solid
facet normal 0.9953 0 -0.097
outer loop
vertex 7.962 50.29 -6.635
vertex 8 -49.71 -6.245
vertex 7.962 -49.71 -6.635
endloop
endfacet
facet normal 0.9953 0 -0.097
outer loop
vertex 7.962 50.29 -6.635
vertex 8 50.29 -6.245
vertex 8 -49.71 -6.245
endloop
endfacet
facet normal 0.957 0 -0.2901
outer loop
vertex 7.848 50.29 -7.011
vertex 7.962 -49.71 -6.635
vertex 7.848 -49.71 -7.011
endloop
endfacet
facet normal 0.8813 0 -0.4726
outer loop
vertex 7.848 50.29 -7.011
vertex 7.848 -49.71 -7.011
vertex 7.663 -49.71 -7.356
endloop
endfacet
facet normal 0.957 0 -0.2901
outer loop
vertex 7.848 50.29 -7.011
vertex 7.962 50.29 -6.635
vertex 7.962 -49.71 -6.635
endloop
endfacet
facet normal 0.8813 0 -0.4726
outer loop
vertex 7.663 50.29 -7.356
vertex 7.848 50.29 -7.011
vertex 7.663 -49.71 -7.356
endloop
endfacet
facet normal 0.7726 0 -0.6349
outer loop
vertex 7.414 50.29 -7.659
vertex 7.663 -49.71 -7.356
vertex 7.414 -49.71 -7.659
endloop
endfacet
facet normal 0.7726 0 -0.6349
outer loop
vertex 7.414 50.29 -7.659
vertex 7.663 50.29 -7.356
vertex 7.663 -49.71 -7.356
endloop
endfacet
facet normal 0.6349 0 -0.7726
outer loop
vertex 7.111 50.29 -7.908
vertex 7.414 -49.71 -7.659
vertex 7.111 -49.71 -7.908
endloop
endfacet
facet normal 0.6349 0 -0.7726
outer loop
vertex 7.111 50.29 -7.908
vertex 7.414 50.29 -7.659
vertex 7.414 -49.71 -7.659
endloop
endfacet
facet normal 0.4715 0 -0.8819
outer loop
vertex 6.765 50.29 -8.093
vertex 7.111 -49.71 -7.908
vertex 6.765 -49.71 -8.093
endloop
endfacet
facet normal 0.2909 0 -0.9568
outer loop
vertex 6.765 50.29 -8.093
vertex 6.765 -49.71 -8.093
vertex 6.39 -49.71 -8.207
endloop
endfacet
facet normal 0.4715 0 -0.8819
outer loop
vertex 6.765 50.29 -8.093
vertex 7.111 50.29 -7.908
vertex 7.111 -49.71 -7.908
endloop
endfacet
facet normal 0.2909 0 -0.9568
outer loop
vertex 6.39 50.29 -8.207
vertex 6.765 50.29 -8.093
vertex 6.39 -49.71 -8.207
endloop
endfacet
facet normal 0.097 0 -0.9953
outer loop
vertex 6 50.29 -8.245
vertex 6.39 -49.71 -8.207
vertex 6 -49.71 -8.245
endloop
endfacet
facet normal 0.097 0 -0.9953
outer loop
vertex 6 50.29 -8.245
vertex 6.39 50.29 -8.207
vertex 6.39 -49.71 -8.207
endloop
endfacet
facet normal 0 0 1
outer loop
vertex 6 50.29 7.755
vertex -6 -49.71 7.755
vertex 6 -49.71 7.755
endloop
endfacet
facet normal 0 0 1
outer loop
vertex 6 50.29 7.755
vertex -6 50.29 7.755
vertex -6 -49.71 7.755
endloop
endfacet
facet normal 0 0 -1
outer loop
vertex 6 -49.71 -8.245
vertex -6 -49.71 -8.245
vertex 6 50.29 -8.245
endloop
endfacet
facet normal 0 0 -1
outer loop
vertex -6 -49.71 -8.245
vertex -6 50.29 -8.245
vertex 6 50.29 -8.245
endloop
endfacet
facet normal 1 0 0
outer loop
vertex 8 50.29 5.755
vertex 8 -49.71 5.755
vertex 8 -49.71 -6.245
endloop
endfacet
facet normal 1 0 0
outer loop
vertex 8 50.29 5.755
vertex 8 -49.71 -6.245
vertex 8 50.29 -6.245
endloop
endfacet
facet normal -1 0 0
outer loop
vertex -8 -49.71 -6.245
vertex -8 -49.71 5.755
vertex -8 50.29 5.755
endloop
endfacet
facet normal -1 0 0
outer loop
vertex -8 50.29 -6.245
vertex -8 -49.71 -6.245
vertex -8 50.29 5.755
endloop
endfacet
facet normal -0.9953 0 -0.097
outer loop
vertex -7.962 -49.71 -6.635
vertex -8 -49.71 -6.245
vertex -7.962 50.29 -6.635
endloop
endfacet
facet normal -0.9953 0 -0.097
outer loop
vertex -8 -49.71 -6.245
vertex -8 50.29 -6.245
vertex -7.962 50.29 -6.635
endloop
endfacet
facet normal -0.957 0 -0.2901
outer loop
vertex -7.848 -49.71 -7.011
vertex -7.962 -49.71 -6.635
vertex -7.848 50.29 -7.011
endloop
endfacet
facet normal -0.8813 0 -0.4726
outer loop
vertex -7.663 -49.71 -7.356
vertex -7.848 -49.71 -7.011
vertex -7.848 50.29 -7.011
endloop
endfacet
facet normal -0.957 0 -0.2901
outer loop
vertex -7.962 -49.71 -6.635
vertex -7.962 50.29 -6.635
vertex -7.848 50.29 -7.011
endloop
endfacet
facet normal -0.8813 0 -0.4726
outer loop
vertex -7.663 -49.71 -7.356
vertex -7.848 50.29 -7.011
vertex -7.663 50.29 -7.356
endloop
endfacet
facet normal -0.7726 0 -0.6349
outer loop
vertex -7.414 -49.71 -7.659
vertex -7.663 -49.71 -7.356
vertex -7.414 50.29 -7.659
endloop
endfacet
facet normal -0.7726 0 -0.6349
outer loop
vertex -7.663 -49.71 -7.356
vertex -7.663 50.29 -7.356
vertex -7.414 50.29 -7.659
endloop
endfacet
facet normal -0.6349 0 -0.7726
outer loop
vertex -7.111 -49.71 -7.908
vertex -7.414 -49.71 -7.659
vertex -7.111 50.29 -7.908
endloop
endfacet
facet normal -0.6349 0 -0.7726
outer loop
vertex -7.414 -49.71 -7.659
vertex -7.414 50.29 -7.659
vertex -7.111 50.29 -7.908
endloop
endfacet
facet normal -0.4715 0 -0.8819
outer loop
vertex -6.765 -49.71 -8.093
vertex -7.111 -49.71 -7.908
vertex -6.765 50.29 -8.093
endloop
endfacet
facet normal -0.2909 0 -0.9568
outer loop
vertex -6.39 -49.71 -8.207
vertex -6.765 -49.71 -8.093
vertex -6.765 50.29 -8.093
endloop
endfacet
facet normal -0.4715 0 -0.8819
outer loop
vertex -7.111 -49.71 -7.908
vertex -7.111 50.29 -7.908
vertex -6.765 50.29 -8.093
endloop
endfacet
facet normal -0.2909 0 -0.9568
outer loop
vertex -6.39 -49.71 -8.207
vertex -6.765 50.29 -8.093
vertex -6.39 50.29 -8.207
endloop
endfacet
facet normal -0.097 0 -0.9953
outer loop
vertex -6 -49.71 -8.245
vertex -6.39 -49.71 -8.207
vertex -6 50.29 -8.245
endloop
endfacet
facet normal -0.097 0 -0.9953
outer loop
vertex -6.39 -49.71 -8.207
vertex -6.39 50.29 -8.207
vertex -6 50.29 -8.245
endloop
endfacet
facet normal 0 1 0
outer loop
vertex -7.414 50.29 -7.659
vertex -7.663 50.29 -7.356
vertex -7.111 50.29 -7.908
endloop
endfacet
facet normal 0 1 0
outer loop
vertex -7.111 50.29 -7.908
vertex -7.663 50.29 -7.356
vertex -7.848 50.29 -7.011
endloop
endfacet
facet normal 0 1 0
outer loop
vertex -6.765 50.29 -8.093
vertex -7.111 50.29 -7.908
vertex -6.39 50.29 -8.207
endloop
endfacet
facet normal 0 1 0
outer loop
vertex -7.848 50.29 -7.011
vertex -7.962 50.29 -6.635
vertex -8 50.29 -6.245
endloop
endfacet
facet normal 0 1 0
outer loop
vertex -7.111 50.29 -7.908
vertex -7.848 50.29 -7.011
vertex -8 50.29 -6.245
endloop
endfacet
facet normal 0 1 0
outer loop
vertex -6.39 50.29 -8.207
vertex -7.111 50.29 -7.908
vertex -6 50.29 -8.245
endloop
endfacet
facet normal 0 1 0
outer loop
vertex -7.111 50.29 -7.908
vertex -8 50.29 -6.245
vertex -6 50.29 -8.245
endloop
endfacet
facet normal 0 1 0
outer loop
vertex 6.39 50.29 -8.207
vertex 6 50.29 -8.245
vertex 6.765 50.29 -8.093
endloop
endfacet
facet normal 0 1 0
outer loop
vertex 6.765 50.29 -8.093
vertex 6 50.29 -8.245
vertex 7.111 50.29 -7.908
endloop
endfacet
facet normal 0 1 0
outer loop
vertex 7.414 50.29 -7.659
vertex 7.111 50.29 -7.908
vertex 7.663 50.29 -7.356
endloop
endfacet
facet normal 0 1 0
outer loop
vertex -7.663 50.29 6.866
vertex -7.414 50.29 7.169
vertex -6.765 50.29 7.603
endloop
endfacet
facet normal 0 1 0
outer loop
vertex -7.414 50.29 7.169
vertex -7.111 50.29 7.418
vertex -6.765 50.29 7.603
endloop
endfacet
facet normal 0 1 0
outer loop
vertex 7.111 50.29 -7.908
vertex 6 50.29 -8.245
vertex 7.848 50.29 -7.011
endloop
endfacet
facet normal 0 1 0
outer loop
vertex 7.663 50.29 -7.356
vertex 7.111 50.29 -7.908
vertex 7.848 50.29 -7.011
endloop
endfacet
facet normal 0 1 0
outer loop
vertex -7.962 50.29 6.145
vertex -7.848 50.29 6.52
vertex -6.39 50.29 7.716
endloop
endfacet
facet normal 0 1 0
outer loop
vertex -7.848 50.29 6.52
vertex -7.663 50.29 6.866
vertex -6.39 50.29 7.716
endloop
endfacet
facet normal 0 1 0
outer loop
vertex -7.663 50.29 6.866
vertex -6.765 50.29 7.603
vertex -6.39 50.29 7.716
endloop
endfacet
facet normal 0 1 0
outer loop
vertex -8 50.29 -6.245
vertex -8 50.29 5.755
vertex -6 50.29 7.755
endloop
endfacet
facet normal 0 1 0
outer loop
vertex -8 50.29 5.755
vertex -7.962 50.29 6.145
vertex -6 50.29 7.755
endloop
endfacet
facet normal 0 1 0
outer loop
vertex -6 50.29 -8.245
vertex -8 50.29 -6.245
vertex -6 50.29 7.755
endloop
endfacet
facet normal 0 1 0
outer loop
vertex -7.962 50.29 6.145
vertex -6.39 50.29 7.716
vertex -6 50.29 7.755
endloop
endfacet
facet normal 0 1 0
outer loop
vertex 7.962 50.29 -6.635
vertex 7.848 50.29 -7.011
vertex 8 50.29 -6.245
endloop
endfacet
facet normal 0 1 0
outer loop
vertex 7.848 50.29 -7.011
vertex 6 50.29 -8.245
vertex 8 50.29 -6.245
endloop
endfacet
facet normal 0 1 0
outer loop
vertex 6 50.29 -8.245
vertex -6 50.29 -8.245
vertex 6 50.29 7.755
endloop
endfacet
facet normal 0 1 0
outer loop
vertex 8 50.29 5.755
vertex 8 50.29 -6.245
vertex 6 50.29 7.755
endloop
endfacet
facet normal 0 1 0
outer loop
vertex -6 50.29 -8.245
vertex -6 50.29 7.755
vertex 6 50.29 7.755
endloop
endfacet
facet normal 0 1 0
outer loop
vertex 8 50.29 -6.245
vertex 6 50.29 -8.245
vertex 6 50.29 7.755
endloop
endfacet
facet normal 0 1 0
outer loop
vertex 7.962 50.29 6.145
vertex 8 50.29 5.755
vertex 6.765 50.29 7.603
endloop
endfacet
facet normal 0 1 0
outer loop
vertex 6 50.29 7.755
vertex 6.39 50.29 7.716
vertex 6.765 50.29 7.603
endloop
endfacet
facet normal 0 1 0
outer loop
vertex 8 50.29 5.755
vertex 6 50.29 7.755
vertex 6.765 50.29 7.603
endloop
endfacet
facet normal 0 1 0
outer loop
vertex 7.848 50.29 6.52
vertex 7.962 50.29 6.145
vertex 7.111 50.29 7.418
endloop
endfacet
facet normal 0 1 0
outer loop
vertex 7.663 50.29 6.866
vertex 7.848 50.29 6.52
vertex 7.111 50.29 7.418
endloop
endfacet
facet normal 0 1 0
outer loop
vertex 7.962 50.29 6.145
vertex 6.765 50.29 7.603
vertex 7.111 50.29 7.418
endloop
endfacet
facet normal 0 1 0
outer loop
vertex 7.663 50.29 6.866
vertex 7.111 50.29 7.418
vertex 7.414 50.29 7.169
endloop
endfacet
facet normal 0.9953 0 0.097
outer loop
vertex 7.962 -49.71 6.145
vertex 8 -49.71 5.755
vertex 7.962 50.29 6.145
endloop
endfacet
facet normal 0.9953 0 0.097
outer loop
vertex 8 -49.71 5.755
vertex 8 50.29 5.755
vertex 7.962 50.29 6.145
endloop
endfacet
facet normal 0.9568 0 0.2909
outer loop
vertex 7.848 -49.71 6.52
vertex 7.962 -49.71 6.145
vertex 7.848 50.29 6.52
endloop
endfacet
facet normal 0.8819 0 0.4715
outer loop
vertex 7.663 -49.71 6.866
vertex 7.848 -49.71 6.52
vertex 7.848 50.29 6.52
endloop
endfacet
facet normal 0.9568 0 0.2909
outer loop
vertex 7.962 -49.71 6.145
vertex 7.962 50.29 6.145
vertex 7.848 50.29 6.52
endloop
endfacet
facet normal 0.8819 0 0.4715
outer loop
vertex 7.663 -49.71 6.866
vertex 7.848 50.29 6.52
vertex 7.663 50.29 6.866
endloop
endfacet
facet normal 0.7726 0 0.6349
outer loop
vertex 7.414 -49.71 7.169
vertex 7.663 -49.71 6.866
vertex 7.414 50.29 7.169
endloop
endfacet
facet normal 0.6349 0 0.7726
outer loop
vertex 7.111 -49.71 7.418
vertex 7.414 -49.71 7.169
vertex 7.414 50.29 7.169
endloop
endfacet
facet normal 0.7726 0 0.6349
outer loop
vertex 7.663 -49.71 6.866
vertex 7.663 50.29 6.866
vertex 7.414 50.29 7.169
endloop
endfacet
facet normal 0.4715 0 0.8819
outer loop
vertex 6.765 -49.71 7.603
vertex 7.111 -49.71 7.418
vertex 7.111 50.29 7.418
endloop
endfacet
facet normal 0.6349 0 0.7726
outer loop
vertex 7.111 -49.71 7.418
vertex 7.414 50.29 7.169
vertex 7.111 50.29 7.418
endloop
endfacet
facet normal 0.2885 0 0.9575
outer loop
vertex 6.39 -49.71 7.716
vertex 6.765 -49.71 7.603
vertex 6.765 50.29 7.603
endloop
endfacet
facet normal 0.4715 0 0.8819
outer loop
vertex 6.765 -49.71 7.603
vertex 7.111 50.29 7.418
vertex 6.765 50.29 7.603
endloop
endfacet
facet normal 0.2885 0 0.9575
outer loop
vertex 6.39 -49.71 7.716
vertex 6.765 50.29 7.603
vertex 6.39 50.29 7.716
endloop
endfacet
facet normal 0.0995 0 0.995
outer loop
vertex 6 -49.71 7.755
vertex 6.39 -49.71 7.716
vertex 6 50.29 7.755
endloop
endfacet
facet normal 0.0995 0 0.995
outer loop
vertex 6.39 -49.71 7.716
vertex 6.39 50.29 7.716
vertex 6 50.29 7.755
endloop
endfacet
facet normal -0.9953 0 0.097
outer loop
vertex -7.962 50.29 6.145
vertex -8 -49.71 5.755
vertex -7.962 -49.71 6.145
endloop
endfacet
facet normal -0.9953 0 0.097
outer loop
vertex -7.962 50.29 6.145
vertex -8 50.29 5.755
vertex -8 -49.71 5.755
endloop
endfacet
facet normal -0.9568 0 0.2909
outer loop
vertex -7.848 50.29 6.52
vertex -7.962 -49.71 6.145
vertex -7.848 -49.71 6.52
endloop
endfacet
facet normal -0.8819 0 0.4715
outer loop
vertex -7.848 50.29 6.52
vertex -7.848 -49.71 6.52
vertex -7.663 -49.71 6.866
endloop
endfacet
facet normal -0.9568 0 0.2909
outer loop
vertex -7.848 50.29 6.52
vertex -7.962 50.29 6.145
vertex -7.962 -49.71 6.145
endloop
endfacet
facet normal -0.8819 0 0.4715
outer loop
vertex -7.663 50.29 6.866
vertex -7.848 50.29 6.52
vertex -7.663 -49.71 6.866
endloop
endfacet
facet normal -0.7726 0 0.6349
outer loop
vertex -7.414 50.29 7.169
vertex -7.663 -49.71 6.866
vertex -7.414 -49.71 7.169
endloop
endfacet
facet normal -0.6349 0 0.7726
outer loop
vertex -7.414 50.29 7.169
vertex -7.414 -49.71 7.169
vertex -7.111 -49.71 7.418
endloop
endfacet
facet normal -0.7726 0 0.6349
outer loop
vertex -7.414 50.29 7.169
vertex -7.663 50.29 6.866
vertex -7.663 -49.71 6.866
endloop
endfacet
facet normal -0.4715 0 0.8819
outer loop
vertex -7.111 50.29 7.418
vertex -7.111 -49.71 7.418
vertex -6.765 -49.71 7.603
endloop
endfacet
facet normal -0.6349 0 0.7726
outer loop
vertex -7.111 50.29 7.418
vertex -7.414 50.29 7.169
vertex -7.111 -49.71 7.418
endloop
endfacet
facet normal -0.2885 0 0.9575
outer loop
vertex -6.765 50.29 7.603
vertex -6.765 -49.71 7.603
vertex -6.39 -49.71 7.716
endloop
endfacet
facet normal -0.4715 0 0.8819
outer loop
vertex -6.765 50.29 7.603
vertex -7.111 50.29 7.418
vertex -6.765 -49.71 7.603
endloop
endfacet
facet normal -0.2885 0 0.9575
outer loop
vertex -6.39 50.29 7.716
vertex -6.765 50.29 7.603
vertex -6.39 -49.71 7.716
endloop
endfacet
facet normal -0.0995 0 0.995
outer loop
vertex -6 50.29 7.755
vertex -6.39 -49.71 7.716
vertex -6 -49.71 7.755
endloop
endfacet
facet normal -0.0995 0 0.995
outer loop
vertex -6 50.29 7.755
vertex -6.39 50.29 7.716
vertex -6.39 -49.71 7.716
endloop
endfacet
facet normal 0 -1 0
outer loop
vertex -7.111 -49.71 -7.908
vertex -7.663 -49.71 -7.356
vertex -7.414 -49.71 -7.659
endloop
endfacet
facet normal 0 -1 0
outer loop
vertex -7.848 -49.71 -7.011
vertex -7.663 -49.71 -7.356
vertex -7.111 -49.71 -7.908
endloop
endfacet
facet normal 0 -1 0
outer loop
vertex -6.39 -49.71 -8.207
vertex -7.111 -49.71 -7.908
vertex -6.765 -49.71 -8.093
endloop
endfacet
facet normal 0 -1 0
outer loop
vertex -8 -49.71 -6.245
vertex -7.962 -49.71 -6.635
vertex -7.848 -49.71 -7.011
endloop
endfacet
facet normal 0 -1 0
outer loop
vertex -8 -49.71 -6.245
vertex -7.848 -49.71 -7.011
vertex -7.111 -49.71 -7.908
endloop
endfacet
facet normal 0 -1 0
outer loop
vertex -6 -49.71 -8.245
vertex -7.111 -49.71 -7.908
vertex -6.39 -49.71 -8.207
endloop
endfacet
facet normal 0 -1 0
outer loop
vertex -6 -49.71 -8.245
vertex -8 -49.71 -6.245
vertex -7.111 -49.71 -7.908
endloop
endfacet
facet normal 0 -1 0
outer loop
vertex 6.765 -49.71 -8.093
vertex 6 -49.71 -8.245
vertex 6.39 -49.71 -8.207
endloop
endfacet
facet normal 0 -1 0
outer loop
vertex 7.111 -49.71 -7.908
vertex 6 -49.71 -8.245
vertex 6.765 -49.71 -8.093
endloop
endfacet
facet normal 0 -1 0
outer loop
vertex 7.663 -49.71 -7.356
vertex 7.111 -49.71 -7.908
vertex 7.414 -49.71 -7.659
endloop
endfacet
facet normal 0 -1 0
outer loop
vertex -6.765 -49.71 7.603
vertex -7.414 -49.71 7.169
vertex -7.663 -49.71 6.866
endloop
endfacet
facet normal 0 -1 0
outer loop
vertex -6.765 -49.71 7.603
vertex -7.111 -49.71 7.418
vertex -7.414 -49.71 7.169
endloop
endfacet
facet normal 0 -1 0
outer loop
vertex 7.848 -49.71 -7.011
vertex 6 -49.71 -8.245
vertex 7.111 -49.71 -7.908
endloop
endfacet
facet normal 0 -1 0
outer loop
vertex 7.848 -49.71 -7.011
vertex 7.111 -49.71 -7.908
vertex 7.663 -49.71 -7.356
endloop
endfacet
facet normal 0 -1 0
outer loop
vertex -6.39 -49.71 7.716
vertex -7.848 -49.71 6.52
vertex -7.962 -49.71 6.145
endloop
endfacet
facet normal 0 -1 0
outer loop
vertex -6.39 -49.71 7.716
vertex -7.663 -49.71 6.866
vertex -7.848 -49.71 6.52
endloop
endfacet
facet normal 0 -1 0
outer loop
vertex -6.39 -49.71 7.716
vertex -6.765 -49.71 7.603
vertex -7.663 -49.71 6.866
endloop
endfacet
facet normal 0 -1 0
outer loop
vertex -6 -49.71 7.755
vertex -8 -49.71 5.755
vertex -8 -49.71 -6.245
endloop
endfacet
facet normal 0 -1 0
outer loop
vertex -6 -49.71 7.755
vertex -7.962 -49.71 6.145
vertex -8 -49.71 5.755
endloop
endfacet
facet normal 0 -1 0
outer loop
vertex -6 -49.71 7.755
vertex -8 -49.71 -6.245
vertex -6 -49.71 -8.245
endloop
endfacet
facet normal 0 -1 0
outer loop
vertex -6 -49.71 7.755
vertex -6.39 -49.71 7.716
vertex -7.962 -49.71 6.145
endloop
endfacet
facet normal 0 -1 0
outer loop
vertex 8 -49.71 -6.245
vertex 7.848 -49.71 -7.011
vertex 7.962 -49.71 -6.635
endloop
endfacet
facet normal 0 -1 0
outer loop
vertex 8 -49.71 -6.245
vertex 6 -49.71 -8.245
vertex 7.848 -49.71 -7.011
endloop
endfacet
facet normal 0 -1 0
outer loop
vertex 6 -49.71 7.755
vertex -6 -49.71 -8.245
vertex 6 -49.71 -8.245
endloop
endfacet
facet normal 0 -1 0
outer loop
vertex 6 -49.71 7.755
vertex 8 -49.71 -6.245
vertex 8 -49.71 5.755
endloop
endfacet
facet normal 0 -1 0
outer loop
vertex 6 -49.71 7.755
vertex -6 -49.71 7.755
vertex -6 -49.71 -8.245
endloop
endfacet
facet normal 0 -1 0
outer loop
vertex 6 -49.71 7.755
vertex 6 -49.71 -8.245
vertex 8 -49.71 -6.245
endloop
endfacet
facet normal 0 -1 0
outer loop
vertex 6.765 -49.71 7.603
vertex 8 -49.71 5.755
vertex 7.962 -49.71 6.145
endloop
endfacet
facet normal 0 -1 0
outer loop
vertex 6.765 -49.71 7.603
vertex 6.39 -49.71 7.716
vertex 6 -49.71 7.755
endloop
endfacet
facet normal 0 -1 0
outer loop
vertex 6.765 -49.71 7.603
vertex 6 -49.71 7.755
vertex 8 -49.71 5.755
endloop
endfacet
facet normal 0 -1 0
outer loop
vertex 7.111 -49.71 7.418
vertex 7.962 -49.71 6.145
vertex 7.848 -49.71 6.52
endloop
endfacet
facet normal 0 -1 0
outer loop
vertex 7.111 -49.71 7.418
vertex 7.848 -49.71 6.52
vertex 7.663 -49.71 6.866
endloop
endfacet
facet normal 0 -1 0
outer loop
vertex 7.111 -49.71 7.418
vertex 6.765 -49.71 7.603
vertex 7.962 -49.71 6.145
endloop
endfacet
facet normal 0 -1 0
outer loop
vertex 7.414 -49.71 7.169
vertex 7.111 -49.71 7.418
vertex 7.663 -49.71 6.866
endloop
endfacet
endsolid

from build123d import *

# Parameters (mm, degrees)
SKETCH2_W           = 16
SKETCH2_H           = 100
BOSS_EXTRUDE1_DEPTH = 16
FILLET1_R           = 2


with BuildPart() as part:
    # Sketch2 → Boss-Extrude1 (new body)
    with BuildSketch(Plane(origin=(0, 0.289898766, 7.754792002), x_dir=(1, 0, 0), z_dir=(0, 0, 1))):
        Rectangle(SKETCH2_W, SKETCH2_H)
    extrude(amount=-BOSS_EXTRUDE1_DEPTH)

    # Fillet1
    fillet1_edges = [part.edges().sort_by_distance(p)[0] for p in [
        (8, 0.289898766, -8.245207998),
        (-8, 0.289898766, -8.245207998),
        (8, 0.289898766, 7.754792002),
        (-8, 0.289898766, 7.754792002),
    ]]
    fillet(fillet1_edges, radius=FILLET1_R)


solid = part.part
